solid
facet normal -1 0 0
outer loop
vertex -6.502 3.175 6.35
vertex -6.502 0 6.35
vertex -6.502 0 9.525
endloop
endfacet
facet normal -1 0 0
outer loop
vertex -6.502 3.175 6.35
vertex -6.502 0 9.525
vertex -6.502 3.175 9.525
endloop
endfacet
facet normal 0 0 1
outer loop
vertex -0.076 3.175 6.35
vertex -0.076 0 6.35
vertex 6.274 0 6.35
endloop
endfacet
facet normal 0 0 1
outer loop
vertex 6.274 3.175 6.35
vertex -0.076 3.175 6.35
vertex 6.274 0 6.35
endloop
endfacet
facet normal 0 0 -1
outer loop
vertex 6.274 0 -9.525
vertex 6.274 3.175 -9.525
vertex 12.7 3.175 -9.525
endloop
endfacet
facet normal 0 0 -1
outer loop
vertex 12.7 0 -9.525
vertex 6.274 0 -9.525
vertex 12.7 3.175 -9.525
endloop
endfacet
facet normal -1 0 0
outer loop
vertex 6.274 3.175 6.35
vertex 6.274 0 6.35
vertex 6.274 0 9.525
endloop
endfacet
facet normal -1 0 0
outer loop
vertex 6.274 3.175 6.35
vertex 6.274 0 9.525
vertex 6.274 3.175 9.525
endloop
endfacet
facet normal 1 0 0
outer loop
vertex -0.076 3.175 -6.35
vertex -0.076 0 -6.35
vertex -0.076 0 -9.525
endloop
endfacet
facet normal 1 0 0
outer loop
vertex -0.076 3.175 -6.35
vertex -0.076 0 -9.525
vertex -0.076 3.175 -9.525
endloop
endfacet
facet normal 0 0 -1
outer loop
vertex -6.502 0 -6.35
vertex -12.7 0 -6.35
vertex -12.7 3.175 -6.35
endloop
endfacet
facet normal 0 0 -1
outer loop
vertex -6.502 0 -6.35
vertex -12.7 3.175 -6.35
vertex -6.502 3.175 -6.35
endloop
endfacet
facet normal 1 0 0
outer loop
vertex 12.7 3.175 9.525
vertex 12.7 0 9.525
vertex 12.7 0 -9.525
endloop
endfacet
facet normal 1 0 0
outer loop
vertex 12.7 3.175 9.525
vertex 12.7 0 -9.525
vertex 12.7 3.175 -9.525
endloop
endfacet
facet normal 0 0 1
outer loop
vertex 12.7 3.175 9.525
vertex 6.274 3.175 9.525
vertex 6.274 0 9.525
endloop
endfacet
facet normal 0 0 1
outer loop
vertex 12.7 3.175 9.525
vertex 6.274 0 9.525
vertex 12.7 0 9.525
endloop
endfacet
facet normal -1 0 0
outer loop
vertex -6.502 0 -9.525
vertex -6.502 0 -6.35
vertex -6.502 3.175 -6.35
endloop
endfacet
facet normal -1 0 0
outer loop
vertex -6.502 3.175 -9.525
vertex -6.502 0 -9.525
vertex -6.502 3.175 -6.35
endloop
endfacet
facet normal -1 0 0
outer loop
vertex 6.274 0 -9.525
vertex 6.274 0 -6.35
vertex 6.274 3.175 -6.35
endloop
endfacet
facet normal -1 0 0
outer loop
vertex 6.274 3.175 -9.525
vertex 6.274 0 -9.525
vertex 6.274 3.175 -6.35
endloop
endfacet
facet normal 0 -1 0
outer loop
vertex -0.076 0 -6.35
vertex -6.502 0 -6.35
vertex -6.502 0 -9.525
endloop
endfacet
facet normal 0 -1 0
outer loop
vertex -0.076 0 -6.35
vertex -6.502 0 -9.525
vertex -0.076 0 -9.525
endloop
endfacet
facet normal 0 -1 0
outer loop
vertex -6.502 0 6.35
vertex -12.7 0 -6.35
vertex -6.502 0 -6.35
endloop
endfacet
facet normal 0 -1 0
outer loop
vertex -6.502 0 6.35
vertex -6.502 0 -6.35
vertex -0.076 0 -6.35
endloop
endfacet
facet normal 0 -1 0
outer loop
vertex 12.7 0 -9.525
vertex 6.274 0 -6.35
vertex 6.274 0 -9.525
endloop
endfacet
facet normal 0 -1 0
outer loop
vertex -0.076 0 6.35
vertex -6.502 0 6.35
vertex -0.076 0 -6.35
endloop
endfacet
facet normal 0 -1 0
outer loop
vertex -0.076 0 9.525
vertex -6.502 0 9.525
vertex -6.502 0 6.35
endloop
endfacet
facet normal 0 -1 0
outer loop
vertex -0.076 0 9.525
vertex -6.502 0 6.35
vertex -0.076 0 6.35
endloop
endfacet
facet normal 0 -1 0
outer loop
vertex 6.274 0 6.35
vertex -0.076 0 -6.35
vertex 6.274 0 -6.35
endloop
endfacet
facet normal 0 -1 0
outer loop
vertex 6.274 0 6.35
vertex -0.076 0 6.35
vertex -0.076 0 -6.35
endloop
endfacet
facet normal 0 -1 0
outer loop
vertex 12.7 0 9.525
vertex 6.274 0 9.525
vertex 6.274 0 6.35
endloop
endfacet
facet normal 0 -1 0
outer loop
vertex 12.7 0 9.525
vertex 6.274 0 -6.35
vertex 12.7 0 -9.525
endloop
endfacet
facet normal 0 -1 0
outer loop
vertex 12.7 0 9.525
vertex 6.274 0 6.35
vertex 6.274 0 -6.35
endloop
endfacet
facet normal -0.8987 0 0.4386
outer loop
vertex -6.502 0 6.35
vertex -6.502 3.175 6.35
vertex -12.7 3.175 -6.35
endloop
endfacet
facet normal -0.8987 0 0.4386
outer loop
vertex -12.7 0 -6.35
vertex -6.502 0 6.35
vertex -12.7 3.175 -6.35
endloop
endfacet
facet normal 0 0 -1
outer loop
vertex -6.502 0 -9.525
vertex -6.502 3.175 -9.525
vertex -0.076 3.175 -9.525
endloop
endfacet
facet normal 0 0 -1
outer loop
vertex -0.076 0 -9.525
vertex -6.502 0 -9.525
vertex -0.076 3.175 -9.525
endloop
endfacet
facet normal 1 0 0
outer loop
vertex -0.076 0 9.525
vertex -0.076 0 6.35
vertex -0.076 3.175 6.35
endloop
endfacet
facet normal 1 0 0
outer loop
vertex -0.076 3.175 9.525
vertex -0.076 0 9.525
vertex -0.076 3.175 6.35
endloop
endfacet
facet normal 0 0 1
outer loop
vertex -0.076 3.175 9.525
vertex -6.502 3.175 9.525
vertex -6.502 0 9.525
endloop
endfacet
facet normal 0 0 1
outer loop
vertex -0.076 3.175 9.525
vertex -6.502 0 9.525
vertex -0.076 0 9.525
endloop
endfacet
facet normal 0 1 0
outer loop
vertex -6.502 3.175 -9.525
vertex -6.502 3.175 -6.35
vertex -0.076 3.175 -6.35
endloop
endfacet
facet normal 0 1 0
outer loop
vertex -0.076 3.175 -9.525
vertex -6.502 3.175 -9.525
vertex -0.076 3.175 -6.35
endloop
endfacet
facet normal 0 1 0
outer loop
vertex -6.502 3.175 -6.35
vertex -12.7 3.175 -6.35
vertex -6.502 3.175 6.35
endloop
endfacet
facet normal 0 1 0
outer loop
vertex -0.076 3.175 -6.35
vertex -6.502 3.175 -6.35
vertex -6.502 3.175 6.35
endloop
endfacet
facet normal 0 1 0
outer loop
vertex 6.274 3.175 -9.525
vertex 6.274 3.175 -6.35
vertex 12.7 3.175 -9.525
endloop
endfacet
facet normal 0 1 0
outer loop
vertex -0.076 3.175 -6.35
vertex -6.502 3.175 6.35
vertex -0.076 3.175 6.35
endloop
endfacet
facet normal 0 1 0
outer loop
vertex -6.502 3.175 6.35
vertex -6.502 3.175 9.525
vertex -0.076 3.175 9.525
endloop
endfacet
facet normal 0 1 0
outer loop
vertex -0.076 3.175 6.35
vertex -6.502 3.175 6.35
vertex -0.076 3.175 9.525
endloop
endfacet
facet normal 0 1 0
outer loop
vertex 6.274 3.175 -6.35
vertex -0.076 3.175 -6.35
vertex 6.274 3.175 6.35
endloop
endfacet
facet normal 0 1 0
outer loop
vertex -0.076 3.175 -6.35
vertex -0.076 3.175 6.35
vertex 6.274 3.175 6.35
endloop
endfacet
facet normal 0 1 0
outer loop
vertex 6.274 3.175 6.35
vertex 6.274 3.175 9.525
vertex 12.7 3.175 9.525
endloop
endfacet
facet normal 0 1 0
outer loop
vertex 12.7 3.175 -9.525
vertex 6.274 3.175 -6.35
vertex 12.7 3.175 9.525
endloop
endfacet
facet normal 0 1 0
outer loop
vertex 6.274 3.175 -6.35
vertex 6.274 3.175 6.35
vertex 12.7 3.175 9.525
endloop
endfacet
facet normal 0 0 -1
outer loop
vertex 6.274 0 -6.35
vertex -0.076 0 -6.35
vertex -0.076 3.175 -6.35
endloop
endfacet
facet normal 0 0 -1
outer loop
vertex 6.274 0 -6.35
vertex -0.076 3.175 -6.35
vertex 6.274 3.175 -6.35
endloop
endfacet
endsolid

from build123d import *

# Parameters (mm, degrees)
SKETCH1_W           = 25.4
SKETCH1_H           = 12.7
BOSS_EXTRUDE1_DEPTH = 3.175
SKETCH2_W           = 6.4262
SKETCH2_H           = 3.175
BOSS_EXTRUDE2_DEPTH = 3.175
CUT_EXTRUDE1_DEPTH  = 3.175


with BuildPart() as part:
    # Sketch1 → Boss-Extrude1 (new body)
    with BuildSketch(Plane(origin=(0, 0, 0), x_dir=(1, 0, 0), z_dir=(0, 1, 0))):
        Rectangle(SKETCH1_W, SKETCH1_H)
    extrude(amount=BOSS_EXTRUDE1_DEPTH)

    # Sketch2 → Boss-Extrude2 (add)
    with BuildSketch(Plane.XY.offset(6.35)):
        with Locations((9.4869, 1.5875)):
            Rectangle(SKETCH2_W, SKETCH2_H)
        with Locations((-3.2893, 1.5875)):
            Rectangle(SKETCH2_W, SKETCH2_H)
    boss_extrude2 = extrude(amount=BOSS_EXTRUDE2_DEPTH)

    # Mirror1: Boss-Extrude2 across plane
    add(boss_extrude2.mirror(Plane.XY))

    # Sketch3 → Cut-Extrude1 (cut)
    with BuildSketch(Plane(origin=(0, 3.175, 0), x_dir=(1, 0, 0), z_dir=(0, 1, 0))):
        Polygon((-6.5024, -6.35), (-12.7, 6.35), (-12.7, -6.35), align=None)
    extrude(amount=-CUT_EXTRUDE1_DEPTH, mode=Mode.SUBTRACT)


solid = part.part
